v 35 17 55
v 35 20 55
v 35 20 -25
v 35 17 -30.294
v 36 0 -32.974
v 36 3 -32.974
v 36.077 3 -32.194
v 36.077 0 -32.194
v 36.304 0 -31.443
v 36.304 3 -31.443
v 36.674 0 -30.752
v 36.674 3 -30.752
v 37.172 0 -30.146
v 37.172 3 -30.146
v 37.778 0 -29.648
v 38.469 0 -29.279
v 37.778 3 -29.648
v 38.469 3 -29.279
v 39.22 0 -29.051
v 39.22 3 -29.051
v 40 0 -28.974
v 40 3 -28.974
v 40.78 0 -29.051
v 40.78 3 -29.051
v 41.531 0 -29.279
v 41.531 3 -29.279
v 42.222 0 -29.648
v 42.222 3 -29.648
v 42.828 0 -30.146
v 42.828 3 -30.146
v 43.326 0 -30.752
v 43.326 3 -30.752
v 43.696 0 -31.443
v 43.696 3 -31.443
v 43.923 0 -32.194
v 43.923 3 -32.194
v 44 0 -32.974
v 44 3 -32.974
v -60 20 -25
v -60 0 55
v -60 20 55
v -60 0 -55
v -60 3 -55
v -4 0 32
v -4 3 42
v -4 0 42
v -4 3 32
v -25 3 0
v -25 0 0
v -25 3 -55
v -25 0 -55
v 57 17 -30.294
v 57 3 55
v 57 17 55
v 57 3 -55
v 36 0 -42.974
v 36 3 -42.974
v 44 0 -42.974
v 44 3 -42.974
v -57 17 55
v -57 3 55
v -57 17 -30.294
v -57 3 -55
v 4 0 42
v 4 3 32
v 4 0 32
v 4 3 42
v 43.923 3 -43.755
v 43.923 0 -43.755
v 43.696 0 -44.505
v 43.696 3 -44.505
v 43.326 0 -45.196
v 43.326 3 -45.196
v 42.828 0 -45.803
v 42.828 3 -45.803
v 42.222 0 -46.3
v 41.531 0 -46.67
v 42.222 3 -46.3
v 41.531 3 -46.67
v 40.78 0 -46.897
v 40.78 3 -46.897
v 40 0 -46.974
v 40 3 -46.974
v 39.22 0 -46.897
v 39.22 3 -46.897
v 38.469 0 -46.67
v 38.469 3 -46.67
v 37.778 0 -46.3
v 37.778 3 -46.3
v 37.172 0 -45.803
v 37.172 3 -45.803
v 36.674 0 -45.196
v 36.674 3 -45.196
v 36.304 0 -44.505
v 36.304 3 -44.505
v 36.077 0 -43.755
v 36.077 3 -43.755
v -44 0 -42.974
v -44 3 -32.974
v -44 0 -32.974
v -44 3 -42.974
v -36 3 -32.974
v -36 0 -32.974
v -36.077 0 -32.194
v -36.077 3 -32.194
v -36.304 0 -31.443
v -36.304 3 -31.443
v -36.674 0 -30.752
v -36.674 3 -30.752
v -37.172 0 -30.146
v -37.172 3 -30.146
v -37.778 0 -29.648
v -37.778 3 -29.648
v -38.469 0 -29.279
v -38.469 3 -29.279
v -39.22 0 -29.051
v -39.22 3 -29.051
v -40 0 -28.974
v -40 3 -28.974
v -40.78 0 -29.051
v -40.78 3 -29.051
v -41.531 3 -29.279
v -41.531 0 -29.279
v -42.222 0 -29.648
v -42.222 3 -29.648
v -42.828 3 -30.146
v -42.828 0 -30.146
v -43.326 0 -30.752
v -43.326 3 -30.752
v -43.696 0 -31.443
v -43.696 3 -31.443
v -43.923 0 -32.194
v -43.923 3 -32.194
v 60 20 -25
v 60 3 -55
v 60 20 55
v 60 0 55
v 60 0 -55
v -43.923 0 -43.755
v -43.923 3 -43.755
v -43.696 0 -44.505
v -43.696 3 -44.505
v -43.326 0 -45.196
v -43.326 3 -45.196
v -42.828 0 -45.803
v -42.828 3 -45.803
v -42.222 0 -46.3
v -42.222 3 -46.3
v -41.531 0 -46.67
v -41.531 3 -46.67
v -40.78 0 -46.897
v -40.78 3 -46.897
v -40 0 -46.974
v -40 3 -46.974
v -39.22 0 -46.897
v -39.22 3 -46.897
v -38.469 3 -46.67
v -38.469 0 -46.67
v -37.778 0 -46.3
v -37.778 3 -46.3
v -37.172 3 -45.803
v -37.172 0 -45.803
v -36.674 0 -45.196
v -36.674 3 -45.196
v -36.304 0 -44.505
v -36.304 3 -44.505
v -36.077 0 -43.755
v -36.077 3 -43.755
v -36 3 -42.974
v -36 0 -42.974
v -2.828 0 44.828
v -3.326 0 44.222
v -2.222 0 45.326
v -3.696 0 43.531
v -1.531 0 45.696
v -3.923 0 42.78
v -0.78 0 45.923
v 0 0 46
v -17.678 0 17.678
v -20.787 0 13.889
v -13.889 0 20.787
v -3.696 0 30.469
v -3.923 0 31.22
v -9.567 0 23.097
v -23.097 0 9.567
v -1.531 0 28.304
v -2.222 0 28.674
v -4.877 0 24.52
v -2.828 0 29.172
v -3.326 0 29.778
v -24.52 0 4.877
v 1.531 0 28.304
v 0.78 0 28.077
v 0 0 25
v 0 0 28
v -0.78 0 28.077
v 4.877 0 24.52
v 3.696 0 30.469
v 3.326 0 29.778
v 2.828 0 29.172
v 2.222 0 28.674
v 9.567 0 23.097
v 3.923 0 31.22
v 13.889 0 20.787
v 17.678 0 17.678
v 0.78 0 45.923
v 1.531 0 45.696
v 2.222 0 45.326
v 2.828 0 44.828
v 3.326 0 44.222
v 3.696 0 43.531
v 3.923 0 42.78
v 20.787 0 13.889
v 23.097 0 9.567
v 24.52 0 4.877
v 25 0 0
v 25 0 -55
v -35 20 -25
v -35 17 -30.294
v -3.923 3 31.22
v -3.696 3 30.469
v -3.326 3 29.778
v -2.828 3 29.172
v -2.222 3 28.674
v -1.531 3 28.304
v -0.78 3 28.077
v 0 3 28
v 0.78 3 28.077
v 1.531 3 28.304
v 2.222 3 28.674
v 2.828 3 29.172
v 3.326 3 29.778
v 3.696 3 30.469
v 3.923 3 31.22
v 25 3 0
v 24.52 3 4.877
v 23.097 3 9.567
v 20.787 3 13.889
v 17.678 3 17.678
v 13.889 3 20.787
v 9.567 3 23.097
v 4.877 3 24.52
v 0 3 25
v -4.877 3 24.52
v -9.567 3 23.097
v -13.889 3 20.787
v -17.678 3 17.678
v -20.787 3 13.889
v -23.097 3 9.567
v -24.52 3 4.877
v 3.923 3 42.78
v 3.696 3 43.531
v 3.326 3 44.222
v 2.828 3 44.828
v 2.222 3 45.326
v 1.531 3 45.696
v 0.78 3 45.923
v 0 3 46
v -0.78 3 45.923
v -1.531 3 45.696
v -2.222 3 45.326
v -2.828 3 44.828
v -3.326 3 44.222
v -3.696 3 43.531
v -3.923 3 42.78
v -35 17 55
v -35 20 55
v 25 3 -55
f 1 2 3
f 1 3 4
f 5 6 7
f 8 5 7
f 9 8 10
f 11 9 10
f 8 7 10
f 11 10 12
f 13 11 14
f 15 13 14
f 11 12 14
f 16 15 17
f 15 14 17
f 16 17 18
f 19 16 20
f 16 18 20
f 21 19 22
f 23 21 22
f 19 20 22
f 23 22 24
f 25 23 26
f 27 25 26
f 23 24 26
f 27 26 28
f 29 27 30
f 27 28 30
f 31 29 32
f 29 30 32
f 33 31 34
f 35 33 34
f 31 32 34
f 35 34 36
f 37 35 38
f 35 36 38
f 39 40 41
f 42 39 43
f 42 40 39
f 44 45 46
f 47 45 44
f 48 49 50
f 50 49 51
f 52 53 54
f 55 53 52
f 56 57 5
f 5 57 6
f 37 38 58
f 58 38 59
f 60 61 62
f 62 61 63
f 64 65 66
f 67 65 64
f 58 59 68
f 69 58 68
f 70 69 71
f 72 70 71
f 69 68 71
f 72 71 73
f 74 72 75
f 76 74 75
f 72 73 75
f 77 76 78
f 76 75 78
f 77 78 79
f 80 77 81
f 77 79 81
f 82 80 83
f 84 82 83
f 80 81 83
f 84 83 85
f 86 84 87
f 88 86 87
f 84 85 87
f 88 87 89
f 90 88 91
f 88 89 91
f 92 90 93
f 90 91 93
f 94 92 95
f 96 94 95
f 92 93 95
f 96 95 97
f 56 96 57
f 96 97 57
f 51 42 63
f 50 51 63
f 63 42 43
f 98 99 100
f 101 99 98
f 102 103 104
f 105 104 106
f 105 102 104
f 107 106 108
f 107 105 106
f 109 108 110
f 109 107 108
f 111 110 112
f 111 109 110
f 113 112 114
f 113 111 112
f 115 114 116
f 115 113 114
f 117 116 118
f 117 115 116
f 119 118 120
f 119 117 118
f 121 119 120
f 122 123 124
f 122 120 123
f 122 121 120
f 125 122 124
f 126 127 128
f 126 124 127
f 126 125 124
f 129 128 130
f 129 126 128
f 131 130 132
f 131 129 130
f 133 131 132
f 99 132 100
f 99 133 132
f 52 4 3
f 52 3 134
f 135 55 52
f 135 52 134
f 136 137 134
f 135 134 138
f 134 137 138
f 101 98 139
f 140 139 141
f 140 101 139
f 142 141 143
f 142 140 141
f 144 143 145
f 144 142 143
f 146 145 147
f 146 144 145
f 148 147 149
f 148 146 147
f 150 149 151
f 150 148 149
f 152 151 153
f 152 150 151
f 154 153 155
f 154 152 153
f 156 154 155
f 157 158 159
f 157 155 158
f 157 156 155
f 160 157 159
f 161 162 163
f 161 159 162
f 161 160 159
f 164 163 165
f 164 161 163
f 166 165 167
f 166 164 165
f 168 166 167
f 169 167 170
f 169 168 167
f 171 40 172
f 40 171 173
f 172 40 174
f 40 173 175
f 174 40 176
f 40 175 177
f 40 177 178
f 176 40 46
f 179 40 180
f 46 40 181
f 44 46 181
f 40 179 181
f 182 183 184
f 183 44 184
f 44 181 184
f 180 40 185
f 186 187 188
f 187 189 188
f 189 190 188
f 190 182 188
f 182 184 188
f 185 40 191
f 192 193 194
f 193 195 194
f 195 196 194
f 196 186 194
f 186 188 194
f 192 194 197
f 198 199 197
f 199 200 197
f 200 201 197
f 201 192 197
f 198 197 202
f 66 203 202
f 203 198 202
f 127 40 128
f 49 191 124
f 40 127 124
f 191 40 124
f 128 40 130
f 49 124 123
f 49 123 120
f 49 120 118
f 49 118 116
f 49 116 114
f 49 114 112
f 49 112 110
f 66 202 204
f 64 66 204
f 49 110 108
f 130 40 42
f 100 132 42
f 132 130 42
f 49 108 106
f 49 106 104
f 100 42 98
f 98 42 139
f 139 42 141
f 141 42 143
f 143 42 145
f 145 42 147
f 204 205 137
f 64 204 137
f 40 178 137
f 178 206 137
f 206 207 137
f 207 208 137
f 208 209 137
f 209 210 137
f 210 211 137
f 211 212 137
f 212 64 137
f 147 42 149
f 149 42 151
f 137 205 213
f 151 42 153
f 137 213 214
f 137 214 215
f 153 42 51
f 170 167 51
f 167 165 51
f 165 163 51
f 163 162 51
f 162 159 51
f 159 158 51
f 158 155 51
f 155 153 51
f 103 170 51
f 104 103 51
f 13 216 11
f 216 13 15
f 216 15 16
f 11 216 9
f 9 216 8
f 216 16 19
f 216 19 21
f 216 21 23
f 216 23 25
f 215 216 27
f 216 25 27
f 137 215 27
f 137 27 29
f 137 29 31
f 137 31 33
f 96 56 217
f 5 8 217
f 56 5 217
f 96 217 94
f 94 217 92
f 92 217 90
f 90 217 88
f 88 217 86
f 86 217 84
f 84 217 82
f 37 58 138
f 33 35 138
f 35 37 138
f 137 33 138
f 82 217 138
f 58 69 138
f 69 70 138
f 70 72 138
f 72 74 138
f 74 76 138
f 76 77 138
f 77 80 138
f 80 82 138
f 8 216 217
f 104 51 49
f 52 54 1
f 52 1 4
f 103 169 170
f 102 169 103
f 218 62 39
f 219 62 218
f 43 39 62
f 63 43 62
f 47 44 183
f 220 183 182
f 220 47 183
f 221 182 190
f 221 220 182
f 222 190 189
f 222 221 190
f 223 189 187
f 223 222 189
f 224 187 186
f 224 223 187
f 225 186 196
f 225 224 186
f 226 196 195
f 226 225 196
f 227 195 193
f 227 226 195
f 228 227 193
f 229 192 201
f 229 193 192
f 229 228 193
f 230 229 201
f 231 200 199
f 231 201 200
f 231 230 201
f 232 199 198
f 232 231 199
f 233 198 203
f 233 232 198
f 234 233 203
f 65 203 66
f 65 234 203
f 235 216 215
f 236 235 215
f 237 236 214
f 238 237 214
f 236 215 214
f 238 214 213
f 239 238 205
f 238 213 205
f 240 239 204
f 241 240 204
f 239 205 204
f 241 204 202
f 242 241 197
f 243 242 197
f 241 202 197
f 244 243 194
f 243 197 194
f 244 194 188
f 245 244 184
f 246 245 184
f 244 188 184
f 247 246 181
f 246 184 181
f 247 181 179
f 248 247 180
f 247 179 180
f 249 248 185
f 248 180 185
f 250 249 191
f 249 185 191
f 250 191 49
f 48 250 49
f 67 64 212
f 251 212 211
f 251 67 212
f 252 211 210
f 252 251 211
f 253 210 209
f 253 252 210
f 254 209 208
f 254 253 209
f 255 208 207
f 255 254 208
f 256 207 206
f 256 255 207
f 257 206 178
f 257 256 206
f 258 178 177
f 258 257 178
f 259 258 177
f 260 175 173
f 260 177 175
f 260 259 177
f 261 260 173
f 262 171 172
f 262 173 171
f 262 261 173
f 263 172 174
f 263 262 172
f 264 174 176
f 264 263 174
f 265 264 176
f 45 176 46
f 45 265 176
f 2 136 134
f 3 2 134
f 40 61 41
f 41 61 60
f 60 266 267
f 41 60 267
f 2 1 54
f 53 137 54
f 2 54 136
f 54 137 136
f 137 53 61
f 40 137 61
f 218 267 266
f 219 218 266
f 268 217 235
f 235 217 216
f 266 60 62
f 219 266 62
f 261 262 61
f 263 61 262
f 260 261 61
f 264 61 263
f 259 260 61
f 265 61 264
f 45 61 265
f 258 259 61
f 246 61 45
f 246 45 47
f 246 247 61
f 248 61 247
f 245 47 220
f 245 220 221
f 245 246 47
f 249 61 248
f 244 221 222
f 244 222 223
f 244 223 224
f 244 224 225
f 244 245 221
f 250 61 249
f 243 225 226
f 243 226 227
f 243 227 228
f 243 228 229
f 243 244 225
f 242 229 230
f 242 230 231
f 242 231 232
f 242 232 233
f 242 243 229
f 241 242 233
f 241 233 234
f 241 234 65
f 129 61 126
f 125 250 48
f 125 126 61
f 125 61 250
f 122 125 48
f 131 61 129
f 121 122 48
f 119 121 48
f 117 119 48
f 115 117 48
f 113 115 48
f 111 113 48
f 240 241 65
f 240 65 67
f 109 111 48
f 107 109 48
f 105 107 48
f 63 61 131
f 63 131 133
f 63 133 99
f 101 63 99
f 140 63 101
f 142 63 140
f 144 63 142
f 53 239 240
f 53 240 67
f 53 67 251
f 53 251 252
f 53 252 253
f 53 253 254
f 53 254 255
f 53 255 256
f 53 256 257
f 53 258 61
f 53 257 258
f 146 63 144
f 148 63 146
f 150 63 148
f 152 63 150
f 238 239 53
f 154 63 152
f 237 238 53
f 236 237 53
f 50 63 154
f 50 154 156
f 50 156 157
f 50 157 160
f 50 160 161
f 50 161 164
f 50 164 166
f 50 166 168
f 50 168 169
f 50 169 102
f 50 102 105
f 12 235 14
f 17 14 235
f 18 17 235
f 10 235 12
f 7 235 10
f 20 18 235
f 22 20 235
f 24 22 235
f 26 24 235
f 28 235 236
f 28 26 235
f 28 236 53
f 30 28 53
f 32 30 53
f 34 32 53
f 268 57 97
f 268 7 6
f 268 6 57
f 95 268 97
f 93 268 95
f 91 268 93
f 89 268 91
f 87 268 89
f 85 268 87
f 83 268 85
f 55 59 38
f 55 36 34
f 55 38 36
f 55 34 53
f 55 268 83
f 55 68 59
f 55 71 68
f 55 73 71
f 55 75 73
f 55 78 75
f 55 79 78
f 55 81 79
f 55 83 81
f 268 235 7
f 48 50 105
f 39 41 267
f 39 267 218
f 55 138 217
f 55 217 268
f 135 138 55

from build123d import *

# Parameters (mm, degrees)
BOSS_EXTRUDE1_DEPTH = 3
SKETCH1_3_W         = 3
SKETCH1_3_H         = 110
BOSS_EXTRUDE2_DEPTH = 20
SKETCH4_W           = 110
SKETCH4_H           = 3
BOSS_EXTRUDE3_DEPTH = 22
SKETCH9_W           = 153.774265812
SKETCH9_H           = 63.565026257
CUT_EXTRUDE1_DEPTH  = 96.502301832
CUT_EXTRUDE2_DEPTH  = 22
CUT_EXTRUDE3_DEPTH  = 22


with BuildPart() as part:
    # Sketch1 → Boss-Extrude1 (new body)
    with BuildSketch(Plane(origin=(0, 0, 0), x_dir=(1, 0, 0), z_dir=(0, 1, 0))):
        with BuildLine():
            Line((-25, 55), (-57, 55))
            Line((-57, 55), (-57, -55))
            Line((-57, -55), (57, -55))
            Line((57, -55), (57, 55))
            Line((57, 55), (25, 55))
            Line((25, 55), (25, 0))
            ThreePointArc((25, 0), (0, -25), (-25, 0))
            Line((-25, 0), (-25, 55))
        make_face()
    extrude(amount=BOSS_EXTRUDE1_DEPTH)

    # Sketch1<3> → Boss-Extrude2 (add)
    with BuildSketch(Plane(origin=(0, 0, 0), x_dir=(1, 0, 0), z_dir=(0, 1, 0))):
        with Locations((-58.5, 0)):
            Rectangle(SKETCH1_3_W, SKETCH1_3_H)
        with Locations((58.5, 0)):
            Rectangle(SKETCH1_3_W, SKETCH1_3_H)
    extrude(amount=BOSS_EXTRUDE2_DEPTH)

    # Sketch4 → Boss-Extrude3 (add)
    with BuildSketch(Plane(origin=(-57, 0, 0), x_dir=(0, 0, -1), z_dir=(1, 0, 0))):
        with Locations((0, 18.5)):
            Rectangle(SKETCH4_W, SKETCH4_H)
    boss_extrude3 = extrude(amount=BOSS_EXTRUDE3_DEPTH)

    # Mirror1: Boss-Extrude3 across plane
    add(boss_extrude3.mirror(Plane(origin=(0, 0, 0), x_dir=(0, 0, 1), z_dir=(1, 0, 0))))

    # Sketch9 → Cut-Extrude1 (cut, through all)
    with BuildSketch(Plane(origin=(0, 25.862068966, -14.655172414), x_dir=(1, 0, 0), z_dir=(0, 0.8700221858486125, -0.4930125719808804))):
        with Locations((-2.934476774, 31.782513129)):
            Rectangle(SKETCH9_W, SKETCH9_H)
    extrude(amount=CUT_EXTRUDE1_DEPTH, mode=Mode.SUBTRACT)

    # Sketch10 → Cut-Extrude2 (cut)
    with BuildSketch(Plane(origin=(0, 3, 0), x_dir=(1, 0, 0), z_dir=(0, 1, 0))):
        with BuildLine():
            Line((-36, 42.9741892), (-36, 32.9741892))
            ThreePointArc((-36, 32.9741892), (-40, 28.9741892), (-44, 32.9741892))
            Line((-44, 32.9741892), (-44, 42.9741892))
            ThreePointArc((-44, 42.9741892), (-40, 46.9741892), (-36, 42.9741892))
        make_face()
    cut_extrude2 = extrude(amount=-CUT_EXTRUDE2_DEPTH, mode=Mode.SUBTRACT)

    # Mirror2: Cut-Extrude2 across plane
    add(cut_extrude2.mirror(Plane(origin=(0, 0, 0), x_dir=(0, 0, 1), z_dir=(1, 0, 0))), mode=Mode.SUBTRACT)

    # Sketch11 → Cut-Extrude3 (cut)
    with BuildSketch(Plane(origin=(0, 3, 0), x_dir=(1, 0, 0), z_dir=(0, 1, 0))):
        with BuildLine():
            Line((4, -32), (4, -42))
            ThreePointArc((4, -42), (0, -46), (-4, -42))
            Line((-4, -42), (-4, -32))
            ThreePointArc((-4, -32), (0, -28), (4, -32))
        make_face()
    extrude(amount=-CUT_EXTRUDE3_DEPTH, mode=Mode.SUBTRACT)


solid = part.part
